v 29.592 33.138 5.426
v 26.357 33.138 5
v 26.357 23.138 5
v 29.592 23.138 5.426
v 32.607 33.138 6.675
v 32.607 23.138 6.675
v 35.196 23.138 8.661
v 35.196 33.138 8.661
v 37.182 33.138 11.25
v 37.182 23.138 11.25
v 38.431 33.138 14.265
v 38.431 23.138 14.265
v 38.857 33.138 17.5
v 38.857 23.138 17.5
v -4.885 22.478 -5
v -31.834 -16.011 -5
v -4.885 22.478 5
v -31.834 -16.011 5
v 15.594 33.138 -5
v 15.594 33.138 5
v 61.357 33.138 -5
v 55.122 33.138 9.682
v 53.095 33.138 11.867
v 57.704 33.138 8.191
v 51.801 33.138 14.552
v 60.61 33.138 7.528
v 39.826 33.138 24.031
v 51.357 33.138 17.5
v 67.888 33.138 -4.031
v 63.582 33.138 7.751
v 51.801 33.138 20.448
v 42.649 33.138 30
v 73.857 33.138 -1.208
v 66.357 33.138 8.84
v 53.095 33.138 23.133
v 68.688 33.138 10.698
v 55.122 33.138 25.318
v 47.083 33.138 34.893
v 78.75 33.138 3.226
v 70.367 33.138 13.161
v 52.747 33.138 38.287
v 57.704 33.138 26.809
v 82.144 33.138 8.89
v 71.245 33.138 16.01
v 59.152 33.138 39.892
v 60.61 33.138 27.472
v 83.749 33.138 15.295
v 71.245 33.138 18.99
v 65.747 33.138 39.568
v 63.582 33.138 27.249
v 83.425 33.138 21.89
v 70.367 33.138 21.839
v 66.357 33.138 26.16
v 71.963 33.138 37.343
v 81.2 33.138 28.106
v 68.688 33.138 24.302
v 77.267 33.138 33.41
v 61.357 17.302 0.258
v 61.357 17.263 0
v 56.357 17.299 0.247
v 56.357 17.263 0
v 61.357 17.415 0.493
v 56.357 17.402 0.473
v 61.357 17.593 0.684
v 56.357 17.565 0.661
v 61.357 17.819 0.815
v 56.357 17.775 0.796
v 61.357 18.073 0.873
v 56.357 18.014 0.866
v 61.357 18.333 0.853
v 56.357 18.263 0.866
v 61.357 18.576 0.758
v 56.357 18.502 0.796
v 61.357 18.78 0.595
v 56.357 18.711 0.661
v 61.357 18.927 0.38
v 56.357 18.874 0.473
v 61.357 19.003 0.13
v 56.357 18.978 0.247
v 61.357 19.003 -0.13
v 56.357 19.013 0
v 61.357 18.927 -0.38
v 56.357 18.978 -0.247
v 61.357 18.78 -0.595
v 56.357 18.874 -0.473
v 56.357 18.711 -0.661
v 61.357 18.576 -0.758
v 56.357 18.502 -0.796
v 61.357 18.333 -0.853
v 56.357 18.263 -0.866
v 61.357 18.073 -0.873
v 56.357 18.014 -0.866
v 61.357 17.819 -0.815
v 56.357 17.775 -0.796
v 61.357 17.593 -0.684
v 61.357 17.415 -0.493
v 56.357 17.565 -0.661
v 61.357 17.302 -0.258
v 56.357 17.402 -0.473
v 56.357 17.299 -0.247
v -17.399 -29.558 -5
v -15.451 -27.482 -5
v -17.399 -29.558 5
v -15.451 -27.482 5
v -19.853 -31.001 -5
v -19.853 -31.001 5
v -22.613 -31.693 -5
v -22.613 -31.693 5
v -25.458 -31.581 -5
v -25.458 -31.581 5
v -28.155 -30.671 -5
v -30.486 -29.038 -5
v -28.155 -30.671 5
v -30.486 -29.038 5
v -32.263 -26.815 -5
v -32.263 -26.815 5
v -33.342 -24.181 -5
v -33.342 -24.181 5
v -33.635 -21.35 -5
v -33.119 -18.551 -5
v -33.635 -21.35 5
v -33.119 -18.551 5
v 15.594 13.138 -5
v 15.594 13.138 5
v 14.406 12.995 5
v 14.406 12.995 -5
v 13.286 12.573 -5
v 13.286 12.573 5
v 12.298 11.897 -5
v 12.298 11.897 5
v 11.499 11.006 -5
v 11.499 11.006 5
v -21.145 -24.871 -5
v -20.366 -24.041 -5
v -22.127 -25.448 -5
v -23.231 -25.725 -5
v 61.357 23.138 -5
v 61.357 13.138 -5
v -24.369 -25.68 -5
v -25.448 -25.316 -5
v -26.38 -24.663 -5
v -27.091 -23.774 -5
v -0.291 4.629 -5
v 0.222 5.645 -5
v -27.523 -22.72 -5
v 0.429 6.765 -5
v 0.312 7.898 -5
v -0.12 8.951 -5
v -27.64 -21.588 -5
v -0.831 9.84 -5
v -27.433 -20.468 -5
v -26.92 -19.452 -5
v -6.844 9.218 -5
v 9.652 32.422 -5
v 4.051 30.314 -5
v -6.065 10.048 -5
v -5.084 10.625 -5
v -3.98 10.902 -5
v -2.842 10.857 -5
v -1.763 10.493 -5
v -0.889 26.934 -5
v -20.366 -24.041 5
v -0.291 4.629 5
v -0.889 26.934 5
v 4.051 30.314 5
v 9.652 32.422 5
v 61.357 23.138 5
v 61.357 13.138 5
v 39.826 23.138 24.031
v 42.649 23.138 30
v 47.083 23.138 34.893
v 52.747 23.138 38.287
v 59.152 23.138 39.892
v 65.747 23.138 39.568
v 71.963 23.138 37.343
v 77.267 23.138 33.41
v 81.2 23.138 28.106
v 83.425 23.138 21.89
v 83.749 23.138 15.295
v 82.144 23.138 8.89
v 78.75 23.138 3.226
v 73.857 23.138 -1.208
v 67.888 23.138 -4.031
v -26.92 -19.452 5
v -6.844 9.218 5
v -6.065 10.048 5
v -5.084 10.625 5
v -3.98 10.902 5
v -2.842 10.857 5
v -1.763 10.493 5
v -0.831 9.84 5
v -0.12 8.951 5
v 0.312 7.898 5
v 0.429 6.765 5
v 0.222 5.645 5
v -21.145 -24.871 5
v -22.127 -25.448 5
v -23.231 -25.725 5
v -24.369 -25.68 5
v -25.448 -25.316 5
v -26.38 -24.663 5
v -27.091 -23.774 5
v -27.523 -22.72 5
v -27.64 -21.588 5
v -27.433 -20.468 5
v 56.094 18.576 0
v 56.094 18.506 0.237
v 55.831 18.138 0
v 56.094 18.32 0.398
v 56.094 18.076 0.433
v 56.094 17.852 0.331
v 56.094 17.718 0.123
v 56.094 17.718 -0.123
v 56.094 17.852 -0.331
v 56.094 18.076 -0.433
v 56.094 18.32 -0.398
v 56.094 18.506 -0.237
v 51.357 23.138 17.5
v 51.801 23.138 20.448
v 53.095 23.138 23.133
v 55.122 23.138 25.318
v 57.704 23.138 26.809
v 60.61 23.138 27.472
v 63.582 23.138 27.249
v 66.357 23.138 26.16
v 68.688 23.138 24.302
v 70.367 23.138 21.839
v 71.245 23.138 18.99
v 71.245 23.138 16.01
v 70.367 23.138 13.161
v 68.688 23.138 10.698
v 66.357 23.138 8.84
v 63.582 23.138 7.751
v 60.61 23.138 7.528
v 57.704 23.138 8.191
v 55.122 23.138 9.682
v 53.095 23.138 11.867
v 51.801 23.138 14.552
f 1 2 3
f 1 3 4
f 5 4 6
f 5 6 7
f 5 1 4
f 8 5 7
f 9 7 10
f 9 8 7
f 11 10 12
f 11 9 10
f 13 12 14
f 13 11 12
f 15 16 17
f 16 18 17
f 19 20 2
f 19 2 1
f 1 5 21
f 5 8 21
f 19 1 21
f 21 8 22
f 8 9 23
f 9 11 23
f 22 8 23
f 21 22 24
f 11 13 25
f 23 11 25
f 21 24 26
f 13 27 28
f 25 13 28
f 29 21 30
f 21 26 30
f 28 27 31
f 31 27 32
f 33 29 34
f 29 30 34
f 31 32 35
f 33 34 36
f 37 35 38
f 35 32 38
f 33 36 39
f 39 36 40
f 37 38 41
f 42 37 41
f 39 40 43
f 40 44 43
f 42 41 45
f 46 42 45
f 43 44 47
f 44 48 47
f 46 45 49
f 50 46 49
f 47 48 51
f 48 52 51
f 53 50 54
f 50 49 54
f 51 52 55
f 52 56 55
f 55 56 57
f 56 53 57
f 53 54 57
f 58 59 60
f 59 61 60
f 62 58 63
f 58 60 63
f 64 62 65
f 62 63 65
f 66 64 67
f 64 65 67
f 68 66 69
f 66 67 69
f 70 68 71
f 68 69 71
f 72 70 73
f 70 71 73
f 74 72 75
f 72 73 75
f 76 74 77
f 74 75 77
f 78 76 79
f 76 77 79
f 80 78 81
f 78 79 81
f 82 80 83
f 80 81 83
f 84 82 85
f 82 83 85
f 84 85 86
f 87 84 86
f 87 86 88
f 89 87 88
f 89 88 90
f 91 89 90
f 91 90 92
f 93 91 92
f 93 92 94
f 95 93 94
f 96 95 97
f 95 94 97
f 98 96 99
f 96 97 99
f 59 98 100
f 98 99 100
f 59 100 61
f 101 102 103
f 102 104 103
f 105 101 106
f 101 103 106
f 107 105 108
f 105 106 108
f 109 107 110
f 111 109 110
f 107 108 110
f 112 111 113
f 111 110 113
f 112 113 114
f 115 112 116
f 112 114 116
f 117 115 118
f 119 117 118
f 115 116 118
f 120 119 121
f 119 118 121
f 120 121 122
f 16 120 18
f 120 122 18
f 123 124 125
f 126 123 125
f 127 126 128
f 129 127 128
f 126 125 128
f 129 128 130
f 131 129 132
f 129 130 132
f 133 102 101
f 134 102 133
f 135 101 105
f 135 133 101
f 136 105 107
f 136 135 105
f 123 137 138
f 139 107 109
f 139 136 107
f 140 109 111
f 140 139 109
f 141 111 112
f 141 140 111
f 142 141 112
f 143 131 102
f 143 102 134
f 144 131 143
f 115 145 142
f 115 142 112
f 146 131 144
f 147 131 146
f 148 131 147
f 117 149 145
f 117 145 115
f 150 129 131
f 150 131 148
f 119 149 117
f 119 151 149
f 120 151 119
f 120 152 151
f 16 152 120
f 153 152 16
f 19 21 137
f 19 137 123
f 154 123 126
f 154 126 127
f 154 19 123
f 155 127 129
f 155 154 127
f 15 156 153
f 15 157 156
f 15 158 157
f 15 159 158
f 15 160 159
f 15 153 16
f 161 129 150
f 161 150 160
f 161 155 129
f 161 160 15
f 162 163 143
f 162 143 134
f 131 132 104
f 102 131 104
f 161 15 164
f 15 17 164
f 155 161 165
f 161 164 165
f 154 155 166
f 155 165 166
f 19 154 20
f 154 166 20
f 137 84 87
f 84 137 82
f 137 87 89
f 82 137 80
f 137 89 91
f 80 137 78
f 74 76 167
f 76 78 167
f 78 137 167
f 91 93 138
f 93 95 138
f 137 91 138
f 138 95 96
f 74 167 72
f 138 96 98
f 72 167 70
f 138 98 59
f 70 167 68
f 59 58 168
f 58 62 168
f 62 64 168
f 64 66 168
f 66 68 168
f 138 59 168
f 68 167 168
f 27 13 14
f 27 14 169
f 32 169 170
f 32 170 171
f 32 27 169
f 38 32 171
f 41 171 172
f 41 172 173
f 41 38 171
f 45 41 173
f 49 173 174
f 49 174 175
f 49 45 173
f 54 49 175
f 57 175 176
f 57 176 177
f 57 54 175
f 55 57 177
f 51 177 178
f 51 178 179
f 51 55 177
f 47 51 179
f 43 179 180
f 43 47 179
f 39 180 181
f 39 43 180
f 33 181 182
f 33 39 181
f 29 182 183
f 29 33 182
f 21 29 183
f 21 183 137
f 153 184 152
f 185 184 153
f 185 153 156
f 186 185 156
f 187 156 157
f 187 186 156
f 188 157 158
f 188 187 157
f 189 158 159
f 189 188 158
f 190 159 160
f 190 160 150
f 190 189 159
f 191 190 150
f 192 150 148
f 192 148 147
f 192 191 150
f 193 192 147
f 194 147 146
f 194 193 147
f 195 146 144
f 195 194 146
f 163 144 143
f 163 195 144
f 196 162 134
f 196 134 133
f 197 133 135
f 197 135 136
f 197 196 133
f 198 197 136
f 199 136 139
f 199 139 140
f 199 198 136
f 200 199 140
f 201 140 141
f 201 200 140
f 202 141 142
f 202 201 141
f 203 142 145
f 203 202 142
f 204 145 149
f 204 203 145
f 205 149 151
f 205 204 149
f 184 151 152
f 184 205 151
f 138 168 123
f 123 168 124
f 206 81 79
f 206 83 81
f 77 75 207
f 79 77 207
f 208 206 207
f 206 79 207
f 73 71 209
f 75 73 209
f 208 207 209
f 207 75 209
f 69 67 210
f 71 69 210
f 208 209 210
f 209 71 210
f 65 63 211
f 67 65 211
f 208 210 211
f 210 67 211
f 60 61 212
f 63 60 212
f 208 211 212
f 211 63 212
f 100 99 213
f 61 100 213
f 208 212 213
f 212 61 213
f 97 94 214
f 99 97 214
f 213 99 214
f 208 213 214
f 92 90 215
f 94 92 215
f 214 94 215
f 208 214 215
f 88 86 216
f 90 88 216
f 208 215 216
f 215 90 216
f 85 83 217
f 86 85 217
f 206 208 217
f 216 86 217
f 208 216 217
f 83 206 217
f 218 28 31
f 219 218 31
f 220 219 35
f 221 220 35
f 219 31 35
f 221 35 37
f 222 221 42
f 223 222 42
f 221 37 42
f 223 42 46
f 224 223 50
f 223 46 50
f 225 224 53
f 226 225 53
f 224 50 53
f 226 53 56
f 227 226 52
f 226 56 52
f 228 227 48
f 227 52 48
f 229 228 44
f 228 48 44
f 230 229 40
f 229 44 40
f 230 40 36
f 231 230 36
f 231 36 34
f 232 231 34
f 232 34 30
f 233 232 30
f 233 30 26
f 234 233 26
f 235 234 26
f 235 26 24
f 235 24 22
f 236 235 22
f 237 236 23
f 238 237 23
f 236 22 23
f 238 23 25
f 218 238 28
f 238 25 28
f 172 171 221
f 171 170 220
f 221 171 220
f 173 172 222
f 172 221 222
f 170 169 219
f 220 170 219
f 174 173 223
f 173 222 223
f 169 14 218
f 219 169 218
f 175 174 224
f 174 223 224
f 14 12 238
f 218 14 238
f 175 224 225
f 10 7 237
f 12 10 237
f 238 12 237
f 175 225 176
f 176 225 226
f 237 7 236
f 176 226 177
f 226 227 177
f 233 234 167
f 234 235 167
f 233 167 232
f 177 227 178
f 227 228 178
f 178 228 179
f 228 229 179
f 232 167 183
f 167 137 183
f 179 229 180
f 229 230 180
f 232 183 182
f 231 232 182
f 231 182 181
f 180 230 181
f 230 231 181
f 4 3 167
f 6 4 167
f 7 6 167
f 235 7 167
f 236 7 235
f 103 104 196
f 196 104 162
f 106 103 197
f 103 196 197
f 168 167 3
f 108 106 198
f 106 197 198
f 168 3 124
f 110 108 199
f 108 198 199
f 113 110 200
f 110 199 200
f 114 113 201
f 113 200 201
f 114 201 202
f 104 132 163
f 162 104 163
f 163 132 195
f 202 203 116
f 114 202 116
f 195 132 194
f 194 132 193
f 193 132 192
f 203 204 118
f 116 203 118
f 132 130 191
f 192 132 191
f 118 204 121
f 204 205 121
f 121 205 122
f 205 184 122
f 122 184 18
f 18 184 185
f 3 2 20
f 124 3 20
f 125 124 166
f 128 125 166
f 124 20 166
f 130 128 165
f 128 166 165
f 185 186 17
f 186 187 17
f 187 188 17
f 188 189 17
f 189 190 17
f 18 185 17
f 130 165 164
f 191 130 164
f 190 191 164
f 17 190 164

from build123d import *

# Parameters (mm, degrees)
EXTRUDE1_DEPTH                                 = 5
SKETCH2_R                                      = 10
EXTRUDE2_DEPTH                                 = 10
BROCA_DE_ROSQUEAR_PARA_TARRAXA_DE_M2_2X0_D     = 1.75
BROCA_DE_ROSQUEAR_PARA_TARRAXA_DE_M2_2X0_DEPTH = 5
BROCA_DE_ROSQUEAR_PARA_TARRAXA_DE_M2_2X0_TIP   = 0.525753042


with BuildPart() as part:
    # Sketch1 → Extrude1 (new body, symmetric)
    with BuildSketch(Plane.XY):
        with BuildLine():
            Line((11.498532289, 11.006151708), (-15.451429048, -27.482381858))
            ThreePointArc((-15.451429048, -27.482381858), (-29.378713855, -29.938137938), (-31.834469934, -16.010853131))
            Line((-31.834469934, -16.010853131), (-4.884508596, 22.477680435))
            ThreePointArc((-4.884508596, 22.477680435), (4.05057718, 30.313540355), (15.594292511, 33.138269526))
            Line((15.594292511, 33.138269526), (61.357050509, 33.138269526))
            Line((61.357050509, 33.138269526), (61.357050509, 13.138269526))
            Line((61.357050509, 13.138269526), (15.594292511, 13.138269526))
            ThreePointArc((15.594292511, 13.138269526), (13.285549445, 12.573323692), (11.498532289, 11.006151708))
        make_face()
        with BuildLine():
            Line((-26.919557668, -19.45231175), (-6.844382396, 9.218009801))
            ThreePointArc((-6.844382396, 9.218009801), (-1.273468473, 10.200312232), (-0.291166042, 4.62939831))
            Line((-0.291166042, 4.62939831), (-20.366341314, -24.04092324))
            ThreePointArc((-20.366341314, -24.04092324), (-25.937255237, -25.023225672), (-26.919557668, -19.45231175))
        make_face(mode=Mode.SUBTRACT)
    extrude(amount=EXTRUDE1_DEPTH, both=True)

    # Sketch2 → Extrude2 (add)
    with BuildSketch(Plane(origin=(0, 33.138269526, 0), x_dir=(1, 0, 0), z_dir=(0, 1, 0))):
        with BuildLine():
            Line((61.357050509, 5), (15.594292511, 5))
            Line((15.594292511, 5), (15.594292511, -5))
            Line((15.594292511, -5), (26.357050509, -5))
            ThreePointArc((26.357050509, -5), (35.195885274, -8.661165235), (38.857050509, -17.5))
            ThreePointArc((38.857050509, -17.5), (77.266953086, -33.409902577), (61.357050509, 5))
        make_face()
        with Locations(Location((61.357050509, -17.5, 0), (0, 0, 180))):  # turned: the seam where the file's is
            Circle(SKETCH2_R, mode=Mode.SUBTRACT)
    extrude(amount=-EXTRUDE2_DEPTH)

    # Broca de rosquear para tarraxa de M2.2x0.451
    with Locations(Plane(origin=(61.357050509, 18.138269526, 0), x_dir=(0, 1, 0), z_dir=(1, 0, 0))):
        with Locations((0, 0)):
            Hole(BROCA_DE_ROSQUEAR_PARA_TARRAXA_DE_M2_2X0_D / 2, depth=BROCA_DE_ROSQUEAR_PARA_TARRAXA_DE_M2_2X0_DEPTH)
            with Locations((0, 0, -(BROCA_DE_ROSQUEAR_PARA_TARRAXA_DE_M2_2X0_DEPTH + BROCA_DE_ROSQUEAR_PARA_TARRAXA_DE_M2_2X0_TIP / 2))):  # 118° drill point
                Cone(0, BROCA_DE_ROSQUEAR_PARA_TARRAXA_DE_M2_2X0_D / 2, BROCA_DE_ROSQUEAR_PARA_TARRAXA_DE_M2_2X0_TIP, mode=Mode.SUBTRACT)


solid = part.part
